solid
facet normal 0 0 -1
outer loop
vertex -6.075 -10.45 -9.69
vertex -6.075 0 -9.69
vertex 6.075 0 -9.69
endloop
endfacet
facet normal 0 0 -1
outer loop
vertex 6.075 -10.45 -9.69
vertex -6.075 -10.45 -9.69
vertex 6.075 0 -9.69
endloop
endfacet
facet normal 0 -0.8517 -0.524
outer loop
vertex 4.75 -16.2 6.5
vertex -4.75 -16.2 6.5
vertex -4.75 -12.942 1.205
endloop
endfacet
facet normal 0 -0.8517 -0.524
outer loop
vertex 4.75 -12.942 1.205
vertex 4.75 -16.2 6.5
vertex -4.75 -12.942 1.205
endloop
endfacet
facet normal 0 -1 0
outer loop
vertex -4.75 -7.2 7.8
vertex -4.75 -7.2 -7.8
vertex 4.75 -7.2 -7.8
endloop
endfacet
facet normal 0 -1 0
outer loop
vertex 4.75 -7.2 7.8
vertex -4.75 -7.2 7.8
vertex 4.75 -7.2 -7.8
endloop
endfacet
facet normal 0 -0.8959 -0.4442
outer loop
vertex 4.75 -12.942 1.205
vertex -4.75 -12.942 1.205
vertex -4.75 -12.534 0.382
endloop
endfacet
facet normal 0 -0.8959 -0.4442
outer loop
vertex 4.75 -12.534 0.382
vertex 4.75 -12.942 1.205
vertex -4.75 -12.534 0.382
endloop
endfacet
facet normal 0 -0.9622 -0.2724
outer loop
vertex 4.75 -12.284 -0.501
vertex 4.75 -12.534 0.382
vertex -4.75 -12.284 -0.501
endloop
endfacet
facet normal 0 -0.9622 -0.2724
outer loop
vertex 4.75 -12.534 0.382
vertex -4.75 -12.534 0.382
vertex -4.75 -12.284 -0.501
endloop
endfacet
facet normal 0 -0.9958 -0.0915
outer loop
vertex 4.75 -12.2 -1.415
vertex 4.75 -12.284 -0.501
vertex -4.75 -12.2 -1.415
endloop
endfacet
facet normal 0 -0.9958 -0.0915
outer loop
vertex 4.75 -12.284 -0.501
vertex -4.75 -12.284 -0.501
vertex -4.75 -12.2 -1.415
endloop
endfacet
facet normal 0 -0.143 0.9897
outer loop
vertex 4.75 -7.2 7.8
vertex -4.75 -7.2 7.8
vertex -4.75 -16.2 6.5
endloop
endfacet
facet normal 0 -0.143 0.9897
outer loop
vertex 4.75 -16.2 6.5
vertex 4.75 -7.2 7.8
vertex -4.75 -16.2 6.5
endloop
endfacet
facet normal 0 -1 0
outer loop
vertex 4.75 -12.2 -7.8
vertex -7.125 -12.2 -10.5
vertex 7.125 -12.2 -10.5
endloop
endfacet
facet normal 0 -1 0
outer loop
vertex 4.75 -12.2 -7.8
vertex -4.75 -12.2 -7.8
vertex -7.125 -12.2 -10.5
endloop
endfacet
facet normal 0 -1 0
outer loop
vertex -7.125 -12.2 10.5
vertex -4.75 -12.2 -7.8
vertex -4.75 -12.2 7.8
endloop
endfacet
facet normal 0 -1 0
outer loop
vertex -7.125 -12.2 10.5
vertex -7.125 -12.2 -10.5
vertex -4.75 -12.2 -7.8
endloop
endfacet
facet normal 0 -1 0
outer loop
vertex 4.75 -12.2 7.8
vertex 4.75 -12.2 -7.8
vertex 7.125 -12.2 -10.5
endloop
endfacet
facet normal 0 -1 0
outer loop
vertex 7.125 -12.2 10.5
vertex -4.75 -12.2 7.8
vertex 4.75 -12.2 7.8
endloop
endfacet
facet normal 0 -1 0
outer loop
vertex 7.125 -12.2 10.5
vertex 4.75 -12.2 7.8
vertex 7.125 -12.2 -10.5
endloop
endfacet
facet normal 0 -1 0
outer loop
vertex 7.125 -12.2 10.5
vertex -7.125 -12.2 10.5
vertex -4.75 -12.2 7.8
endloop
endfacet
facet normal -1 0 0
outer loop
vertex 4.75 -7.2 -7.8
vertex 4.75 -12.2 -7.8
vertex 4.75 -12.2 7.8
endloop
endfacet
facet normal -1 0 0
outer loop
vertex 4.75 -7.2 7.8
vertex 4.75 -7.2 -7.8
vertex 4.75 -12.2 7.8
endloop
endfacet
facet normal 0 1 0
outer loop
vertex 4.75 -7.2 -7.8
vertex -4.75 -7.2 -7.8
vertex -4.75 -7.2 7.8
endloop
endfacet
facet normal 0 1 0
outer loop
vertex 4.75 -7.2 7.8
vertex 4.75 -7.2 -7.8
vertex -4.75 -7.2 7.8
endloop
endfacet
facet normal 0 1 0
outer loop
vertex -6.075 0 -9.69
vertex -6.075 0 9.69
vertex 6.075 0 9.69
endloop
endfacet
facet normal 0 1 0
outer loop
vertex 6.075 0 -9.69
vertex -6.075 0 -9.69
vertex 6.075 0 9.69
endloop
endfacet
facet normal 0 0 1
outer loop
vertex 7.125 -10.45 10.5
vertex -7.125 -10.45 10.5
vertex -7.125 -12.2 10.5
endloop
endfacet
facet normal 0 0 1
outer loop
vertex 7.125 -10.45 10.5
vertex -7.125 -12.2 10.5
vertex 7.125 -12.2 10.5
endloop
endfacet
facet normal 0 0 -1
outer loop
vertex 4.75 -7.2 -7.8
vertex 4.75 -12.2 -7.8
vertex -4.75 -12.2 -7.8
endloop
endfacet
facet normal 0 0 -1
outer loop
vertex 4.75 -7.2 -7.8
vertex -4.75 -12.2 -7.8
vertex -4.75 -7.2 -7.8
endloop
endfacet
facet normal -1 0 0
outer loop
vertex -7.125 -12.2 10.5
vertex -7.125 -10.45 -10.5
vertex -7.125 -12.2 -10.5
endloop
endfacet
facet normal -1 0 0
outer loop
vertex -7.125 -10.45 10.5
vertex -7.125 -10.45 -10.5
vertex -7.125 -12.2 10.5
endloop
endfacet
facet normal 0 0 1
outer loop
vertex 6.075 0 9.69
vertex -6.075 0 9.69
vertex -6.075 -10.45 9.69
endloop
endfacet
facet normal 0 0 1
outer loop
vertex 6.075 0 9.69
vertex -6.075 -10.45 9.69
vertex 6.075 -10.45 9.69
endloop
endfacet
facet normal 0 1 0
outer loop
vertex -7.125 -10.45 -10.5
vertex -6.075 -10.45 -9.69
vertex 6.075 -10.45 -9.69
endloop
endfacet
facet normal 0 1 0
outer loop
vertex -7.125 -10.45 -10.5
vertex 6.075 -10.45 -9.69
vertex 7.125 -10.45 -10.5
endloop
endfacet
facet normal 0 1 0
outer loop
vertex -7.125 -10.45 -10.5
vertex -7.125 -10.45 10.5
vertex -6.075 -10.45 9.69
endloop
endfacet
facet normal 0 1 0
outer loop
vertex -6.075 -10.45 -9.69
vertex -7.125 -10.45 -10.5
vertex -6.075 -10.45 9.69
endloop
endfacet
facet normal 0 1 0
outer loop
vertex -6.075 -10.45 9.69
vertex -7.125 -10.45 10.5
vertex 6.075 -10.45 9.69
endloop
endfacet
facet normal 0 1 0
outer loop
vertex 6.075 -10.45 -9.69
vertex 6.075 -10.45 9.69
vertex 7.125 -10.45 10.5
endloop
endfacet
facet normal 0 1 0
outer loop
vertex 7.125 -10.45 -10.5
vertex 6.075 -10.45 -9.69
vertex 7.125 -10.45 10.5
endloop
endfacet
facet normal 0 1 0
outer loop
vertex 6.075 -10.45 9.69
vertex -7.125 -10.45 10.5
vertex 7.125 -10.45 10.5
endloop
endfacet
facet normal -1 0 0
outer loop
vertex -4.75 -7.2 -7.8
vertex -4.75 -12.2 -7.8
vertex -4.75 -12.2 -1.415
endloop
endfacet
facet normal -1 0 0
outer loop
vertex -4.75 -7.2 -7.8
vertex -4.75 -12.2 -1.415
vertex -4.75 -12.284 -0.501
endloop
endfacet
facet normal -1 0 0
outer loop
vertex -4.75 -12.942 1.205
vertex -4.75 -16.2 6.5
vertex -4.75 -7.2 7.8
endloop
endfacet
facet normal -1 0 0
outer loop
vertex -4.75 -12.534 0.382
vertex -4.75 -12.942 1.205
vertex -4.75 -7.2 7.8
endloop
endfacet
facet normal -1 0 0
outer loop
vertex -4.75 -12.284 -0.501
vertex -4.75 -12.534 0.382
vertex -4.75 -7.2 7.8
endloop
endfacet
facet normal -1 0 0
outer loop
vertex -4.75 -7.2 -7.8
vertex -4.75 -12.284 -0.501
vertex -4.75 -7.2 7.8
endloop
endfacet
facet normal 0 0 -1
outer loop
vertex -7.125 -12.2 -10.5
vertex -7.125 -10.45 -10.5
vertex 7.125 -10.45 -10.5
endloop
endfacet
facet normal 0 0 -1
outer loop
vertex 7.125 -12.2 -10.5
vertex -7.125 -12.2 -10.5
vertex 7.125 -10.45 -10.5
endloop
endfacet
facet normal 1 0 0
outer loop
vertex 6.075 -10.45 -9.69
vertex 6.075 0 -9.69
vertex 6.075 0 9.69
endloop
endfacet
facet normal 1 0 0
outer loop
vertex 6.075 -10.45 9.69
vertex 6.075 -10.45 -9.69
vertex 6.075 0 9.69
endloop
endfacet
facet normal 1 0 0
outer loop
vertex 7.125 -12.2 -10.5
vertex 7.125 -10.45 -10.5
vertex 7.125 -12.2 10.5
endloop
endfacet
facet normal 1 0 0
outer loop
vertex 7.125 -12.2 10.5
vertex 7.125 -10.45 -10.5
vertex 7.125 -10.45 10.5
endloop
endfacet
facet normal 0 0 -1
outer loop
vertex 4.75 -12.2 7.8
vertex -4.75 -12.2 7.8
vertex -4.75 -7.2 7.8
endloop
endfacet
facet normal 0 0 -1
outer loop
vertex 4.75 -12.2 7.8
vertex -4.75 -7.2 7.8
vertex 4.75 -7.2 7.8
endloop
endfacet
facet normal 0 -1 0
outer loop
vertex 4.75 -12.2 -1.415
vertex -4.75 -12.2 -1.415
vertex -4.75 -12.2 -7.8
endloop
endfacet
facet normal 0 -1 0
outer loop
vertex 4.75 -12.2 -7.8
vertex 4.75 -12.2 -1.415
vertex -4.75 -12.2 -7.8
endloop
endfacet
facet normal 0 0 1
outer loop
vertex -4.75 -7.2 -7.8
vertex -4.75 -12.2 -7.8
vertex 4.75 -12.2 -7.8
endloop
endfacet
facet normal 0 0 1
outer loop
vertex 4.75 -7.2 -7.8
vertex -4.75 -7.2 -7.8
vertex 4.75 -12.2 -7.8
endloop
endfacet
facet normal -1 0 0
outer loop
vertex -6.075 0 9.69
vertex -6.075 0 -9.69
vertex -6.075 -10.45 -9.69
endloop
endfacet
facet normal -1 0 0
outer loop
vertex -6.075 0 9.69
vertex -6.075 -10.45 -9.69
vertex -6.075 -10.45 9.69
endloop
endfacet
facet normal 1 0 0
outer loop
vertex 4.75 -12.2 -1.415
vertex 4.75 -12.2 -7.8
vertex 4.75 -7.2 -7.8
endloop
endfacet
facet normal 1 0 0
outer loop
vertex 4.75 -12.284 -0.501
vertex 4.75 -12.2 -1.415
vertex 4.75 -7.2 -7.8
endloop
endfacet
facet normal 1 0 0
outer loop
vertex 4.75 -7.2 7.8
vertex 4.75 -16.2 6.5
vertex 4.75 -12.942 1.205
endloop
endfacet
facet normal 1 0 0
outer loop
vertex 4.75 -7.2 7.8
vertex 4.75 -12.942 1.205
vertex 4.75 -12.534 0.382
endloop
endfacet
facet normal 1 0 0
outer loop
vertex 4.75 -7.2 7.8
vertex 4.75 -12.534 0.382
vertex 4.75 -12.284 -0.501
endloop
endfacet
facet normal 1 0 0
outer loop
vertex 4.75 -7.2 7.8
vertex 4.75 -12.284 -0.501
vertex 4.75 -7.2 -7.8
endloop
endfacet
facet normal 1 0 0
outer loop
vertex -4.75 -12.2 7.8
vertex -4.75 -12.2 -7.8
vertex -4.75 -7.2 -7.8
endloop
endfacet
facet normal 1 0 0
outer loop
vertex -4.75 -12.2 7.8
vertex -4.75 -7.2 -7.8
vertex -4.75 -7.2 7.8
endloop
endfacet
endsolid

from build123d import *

# Parameters (mm, degrees)
F0_W     = 12.15
F0_H     = 19.38
F1_DEPTH = 10.45
F2_W     = 14.25
F2_H     = 21
F3_DEPTH = 1.75
F4_W     = 9.5
F4_H     = 15.6
F5_DEPTH = 5
F7_DEPTH = 9.5


with BuildPart() as f1:
    # F0 (on Front) → F1 (new body)
    with BuildSketch(Plane.XZ):
        Rectangle(F0_W, F0_H)
    extrude(amount=F1_DEPTH)

    # F2 (on face) → F3 (join)
    with BuildSketch(Plane.XZ.offset(10.45)):
        Rectangle(F2_W, F2_H)
    extrude(amount=F3_DEPTH)

    # F4 (on face) → F5 (cut)
    with BuildSketch(Plane.XZ.offset(12.2)):
        Rectangle(F4_W, F4_H)
    extrude(amount=-F5_DEPTH, mode=Mode.SUBTRACT)


with BuildPart() as f7:
    # F6 (on face) → F7 (new body)
    with BuildSketch(Plane.YZ.offset(-4.75)):
        with BuildLine():
            Line((-12.2, -1.415211), (-12.2, -7.8))
            Line((-12.2, -7.8), (-7.2, -7.8))
            Line((-7.2, -7.8), (-7.2, 7.8))
            Line((-7.2, 7.8), (-16.2, 6.5))
            Line((-16.2, 6.5), (-12.941708, 1.205276))
            ThreePointArc((-12.941708, 1.205276), (-12.388999, -0.053495), (-12.2, -1.415211))
        make_face()
    extrude(amount=F7_DEPTH)


solid = Compound([f1.part, f7.part])
